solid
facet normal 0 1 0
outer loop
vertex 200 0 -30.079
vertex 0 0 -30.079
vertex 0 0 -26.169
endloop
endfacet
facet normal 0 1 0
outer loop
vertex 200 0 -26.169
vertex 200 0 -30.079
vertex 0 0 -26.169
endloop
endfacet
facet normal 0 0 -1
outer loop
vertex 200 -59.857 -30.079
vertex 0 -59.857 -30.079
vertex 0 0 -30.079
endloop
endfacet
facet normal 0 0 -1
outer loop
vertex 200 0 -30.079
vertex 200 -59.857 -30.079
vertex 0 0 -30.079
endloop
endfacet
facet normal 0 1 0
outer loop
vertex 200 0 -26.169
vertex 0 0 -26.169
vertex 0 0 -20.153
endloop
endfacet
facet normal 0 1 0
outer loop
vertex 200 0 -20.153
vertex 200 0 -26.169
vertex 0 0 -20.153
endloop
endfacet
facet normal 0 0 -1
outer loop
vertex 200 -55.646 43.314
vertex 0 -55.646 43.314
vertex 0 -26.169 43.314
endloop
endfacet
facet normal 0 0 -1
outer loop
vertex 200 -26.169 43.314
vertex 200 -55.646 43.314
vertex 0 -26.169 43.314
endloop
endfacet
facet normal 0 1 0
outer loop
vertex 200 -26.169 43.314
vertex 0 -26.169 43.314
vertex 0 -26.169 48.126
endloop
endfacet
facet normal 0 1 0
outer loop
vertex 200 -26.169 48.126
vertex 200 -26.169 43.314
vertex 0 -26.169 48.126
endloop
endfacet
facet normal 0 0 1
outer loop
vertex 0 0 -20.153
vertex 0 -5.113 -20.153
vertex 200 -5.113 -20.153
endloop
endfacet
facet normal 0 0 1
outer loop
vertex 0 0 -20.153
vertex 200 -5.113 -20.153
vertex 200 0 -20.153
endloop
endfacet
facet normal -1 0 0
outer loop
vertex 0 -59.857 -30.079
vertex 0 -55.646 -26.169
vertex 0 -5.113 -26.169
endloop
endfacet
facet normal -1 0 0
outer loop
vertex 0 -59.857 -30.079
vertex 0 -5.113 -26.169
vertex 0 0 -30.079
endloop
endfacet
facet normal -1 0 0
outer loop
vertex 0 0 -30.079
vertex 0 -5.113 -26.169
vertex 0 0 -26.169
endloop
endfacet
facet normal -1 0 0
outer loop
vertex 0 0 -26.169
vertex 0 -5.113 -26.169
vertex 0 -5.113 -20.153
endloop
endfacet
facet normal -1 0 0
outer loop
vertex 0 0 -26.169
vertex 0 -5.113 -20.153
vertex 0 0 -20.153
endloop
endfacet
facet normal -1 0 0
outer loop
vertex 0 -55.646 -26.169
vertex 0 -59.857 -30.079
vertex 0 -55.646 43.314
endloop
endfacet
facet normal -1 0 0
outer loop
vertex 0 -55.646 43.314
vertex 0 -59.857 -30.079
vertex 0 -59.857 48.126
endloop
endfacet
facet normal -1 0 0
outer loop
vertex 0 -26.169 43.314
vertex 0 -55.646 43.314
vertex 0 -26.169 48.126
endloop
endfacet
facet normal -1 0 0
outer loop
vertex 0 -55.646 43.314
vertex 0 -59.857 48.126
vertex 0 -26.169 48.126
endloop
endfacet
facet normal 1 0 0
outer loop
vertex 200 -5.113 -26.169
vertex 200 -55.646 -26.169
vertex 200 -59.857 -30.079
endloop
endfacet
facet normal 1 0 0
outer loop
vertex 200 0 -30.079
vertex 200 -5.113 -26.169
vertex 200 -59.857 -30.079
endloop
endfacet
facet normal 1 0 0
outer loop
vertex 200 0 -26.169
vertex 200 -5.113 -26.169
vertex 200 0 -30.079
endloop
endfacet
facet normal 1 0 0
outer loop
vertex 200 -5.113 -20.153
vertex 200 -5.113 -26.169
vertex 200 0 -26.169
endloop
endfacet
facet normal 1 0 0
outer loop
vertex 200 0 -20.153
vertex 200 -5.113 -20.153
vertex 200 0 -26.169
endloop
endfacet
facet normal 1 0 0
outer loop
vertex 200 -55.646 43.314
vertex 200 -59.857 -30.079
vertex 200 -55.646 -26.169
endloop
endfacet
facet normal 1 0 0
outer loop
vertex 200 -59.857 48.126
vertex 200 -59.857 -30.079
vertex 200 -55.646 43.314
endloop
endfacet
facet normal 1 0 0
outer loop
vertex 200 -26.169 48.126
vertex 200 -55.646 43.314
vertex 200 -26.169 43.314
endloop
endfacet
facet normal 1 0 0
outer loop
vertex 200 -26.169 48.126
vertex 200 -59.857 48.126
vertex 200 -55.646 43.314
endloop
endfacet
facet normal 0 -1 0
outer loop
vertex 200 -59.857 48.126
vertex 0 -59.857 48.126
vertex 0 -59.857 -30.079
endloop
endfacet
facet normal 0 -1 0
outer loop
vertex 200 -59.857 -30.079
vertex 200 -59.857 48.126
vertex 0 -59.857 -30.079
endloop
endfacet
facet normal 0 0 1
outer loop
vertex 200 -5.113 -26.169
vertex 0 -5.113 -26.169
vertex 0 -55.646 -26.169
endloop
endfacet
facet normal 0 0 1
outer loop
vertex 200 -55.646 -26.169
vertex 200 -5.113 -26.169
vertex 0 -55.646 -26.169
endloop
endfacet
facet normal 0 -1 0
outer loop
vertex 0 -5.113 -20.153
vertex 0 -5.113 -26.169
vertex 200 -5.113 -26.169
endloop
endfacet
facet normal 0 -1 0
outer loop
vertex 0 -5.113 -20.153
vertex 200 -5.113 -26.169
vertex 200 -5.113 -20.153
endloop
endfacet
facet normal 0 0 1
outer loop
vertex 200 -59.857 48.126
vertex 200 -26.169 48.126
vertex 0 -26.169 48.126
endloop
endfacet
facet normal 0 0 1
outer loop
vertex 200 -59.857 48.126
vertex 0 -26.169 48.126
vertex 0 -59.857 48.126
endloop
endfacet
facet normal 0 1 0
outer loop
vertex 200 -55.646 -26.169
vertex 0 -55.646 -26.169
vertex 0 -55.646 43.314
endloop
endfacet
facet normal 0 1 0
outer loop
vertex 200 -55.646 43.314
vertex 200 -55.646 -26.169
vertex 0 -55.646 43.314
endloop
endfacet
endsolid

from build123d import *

# Parameters (mm, degrees)
F0_W     = 5.113421
F0_H     = 6.01579
F1_DEPTH = 200


with BuildPart() as f1:
    # F0 (on Right) → F1 (new body)
    with BuildSketch(Plane.YZ):
        with Locations((-2.55671, -23.16079)):
            Rectangle(F0_W, F0_H)
        Polygon((-59.857104, -30.078948), (0, -30.078948), (0, -26.168685), (-5.113421, -26.168685), (-55.646054, -26.168685), (-55.646054, 43.313686), (-26.168685, 43.313686), (-26.168685, 48.126314), (-59.857104, 48.126314), align=None)
    extrude(amount=F1_DEPTH)


solid = f1.part
